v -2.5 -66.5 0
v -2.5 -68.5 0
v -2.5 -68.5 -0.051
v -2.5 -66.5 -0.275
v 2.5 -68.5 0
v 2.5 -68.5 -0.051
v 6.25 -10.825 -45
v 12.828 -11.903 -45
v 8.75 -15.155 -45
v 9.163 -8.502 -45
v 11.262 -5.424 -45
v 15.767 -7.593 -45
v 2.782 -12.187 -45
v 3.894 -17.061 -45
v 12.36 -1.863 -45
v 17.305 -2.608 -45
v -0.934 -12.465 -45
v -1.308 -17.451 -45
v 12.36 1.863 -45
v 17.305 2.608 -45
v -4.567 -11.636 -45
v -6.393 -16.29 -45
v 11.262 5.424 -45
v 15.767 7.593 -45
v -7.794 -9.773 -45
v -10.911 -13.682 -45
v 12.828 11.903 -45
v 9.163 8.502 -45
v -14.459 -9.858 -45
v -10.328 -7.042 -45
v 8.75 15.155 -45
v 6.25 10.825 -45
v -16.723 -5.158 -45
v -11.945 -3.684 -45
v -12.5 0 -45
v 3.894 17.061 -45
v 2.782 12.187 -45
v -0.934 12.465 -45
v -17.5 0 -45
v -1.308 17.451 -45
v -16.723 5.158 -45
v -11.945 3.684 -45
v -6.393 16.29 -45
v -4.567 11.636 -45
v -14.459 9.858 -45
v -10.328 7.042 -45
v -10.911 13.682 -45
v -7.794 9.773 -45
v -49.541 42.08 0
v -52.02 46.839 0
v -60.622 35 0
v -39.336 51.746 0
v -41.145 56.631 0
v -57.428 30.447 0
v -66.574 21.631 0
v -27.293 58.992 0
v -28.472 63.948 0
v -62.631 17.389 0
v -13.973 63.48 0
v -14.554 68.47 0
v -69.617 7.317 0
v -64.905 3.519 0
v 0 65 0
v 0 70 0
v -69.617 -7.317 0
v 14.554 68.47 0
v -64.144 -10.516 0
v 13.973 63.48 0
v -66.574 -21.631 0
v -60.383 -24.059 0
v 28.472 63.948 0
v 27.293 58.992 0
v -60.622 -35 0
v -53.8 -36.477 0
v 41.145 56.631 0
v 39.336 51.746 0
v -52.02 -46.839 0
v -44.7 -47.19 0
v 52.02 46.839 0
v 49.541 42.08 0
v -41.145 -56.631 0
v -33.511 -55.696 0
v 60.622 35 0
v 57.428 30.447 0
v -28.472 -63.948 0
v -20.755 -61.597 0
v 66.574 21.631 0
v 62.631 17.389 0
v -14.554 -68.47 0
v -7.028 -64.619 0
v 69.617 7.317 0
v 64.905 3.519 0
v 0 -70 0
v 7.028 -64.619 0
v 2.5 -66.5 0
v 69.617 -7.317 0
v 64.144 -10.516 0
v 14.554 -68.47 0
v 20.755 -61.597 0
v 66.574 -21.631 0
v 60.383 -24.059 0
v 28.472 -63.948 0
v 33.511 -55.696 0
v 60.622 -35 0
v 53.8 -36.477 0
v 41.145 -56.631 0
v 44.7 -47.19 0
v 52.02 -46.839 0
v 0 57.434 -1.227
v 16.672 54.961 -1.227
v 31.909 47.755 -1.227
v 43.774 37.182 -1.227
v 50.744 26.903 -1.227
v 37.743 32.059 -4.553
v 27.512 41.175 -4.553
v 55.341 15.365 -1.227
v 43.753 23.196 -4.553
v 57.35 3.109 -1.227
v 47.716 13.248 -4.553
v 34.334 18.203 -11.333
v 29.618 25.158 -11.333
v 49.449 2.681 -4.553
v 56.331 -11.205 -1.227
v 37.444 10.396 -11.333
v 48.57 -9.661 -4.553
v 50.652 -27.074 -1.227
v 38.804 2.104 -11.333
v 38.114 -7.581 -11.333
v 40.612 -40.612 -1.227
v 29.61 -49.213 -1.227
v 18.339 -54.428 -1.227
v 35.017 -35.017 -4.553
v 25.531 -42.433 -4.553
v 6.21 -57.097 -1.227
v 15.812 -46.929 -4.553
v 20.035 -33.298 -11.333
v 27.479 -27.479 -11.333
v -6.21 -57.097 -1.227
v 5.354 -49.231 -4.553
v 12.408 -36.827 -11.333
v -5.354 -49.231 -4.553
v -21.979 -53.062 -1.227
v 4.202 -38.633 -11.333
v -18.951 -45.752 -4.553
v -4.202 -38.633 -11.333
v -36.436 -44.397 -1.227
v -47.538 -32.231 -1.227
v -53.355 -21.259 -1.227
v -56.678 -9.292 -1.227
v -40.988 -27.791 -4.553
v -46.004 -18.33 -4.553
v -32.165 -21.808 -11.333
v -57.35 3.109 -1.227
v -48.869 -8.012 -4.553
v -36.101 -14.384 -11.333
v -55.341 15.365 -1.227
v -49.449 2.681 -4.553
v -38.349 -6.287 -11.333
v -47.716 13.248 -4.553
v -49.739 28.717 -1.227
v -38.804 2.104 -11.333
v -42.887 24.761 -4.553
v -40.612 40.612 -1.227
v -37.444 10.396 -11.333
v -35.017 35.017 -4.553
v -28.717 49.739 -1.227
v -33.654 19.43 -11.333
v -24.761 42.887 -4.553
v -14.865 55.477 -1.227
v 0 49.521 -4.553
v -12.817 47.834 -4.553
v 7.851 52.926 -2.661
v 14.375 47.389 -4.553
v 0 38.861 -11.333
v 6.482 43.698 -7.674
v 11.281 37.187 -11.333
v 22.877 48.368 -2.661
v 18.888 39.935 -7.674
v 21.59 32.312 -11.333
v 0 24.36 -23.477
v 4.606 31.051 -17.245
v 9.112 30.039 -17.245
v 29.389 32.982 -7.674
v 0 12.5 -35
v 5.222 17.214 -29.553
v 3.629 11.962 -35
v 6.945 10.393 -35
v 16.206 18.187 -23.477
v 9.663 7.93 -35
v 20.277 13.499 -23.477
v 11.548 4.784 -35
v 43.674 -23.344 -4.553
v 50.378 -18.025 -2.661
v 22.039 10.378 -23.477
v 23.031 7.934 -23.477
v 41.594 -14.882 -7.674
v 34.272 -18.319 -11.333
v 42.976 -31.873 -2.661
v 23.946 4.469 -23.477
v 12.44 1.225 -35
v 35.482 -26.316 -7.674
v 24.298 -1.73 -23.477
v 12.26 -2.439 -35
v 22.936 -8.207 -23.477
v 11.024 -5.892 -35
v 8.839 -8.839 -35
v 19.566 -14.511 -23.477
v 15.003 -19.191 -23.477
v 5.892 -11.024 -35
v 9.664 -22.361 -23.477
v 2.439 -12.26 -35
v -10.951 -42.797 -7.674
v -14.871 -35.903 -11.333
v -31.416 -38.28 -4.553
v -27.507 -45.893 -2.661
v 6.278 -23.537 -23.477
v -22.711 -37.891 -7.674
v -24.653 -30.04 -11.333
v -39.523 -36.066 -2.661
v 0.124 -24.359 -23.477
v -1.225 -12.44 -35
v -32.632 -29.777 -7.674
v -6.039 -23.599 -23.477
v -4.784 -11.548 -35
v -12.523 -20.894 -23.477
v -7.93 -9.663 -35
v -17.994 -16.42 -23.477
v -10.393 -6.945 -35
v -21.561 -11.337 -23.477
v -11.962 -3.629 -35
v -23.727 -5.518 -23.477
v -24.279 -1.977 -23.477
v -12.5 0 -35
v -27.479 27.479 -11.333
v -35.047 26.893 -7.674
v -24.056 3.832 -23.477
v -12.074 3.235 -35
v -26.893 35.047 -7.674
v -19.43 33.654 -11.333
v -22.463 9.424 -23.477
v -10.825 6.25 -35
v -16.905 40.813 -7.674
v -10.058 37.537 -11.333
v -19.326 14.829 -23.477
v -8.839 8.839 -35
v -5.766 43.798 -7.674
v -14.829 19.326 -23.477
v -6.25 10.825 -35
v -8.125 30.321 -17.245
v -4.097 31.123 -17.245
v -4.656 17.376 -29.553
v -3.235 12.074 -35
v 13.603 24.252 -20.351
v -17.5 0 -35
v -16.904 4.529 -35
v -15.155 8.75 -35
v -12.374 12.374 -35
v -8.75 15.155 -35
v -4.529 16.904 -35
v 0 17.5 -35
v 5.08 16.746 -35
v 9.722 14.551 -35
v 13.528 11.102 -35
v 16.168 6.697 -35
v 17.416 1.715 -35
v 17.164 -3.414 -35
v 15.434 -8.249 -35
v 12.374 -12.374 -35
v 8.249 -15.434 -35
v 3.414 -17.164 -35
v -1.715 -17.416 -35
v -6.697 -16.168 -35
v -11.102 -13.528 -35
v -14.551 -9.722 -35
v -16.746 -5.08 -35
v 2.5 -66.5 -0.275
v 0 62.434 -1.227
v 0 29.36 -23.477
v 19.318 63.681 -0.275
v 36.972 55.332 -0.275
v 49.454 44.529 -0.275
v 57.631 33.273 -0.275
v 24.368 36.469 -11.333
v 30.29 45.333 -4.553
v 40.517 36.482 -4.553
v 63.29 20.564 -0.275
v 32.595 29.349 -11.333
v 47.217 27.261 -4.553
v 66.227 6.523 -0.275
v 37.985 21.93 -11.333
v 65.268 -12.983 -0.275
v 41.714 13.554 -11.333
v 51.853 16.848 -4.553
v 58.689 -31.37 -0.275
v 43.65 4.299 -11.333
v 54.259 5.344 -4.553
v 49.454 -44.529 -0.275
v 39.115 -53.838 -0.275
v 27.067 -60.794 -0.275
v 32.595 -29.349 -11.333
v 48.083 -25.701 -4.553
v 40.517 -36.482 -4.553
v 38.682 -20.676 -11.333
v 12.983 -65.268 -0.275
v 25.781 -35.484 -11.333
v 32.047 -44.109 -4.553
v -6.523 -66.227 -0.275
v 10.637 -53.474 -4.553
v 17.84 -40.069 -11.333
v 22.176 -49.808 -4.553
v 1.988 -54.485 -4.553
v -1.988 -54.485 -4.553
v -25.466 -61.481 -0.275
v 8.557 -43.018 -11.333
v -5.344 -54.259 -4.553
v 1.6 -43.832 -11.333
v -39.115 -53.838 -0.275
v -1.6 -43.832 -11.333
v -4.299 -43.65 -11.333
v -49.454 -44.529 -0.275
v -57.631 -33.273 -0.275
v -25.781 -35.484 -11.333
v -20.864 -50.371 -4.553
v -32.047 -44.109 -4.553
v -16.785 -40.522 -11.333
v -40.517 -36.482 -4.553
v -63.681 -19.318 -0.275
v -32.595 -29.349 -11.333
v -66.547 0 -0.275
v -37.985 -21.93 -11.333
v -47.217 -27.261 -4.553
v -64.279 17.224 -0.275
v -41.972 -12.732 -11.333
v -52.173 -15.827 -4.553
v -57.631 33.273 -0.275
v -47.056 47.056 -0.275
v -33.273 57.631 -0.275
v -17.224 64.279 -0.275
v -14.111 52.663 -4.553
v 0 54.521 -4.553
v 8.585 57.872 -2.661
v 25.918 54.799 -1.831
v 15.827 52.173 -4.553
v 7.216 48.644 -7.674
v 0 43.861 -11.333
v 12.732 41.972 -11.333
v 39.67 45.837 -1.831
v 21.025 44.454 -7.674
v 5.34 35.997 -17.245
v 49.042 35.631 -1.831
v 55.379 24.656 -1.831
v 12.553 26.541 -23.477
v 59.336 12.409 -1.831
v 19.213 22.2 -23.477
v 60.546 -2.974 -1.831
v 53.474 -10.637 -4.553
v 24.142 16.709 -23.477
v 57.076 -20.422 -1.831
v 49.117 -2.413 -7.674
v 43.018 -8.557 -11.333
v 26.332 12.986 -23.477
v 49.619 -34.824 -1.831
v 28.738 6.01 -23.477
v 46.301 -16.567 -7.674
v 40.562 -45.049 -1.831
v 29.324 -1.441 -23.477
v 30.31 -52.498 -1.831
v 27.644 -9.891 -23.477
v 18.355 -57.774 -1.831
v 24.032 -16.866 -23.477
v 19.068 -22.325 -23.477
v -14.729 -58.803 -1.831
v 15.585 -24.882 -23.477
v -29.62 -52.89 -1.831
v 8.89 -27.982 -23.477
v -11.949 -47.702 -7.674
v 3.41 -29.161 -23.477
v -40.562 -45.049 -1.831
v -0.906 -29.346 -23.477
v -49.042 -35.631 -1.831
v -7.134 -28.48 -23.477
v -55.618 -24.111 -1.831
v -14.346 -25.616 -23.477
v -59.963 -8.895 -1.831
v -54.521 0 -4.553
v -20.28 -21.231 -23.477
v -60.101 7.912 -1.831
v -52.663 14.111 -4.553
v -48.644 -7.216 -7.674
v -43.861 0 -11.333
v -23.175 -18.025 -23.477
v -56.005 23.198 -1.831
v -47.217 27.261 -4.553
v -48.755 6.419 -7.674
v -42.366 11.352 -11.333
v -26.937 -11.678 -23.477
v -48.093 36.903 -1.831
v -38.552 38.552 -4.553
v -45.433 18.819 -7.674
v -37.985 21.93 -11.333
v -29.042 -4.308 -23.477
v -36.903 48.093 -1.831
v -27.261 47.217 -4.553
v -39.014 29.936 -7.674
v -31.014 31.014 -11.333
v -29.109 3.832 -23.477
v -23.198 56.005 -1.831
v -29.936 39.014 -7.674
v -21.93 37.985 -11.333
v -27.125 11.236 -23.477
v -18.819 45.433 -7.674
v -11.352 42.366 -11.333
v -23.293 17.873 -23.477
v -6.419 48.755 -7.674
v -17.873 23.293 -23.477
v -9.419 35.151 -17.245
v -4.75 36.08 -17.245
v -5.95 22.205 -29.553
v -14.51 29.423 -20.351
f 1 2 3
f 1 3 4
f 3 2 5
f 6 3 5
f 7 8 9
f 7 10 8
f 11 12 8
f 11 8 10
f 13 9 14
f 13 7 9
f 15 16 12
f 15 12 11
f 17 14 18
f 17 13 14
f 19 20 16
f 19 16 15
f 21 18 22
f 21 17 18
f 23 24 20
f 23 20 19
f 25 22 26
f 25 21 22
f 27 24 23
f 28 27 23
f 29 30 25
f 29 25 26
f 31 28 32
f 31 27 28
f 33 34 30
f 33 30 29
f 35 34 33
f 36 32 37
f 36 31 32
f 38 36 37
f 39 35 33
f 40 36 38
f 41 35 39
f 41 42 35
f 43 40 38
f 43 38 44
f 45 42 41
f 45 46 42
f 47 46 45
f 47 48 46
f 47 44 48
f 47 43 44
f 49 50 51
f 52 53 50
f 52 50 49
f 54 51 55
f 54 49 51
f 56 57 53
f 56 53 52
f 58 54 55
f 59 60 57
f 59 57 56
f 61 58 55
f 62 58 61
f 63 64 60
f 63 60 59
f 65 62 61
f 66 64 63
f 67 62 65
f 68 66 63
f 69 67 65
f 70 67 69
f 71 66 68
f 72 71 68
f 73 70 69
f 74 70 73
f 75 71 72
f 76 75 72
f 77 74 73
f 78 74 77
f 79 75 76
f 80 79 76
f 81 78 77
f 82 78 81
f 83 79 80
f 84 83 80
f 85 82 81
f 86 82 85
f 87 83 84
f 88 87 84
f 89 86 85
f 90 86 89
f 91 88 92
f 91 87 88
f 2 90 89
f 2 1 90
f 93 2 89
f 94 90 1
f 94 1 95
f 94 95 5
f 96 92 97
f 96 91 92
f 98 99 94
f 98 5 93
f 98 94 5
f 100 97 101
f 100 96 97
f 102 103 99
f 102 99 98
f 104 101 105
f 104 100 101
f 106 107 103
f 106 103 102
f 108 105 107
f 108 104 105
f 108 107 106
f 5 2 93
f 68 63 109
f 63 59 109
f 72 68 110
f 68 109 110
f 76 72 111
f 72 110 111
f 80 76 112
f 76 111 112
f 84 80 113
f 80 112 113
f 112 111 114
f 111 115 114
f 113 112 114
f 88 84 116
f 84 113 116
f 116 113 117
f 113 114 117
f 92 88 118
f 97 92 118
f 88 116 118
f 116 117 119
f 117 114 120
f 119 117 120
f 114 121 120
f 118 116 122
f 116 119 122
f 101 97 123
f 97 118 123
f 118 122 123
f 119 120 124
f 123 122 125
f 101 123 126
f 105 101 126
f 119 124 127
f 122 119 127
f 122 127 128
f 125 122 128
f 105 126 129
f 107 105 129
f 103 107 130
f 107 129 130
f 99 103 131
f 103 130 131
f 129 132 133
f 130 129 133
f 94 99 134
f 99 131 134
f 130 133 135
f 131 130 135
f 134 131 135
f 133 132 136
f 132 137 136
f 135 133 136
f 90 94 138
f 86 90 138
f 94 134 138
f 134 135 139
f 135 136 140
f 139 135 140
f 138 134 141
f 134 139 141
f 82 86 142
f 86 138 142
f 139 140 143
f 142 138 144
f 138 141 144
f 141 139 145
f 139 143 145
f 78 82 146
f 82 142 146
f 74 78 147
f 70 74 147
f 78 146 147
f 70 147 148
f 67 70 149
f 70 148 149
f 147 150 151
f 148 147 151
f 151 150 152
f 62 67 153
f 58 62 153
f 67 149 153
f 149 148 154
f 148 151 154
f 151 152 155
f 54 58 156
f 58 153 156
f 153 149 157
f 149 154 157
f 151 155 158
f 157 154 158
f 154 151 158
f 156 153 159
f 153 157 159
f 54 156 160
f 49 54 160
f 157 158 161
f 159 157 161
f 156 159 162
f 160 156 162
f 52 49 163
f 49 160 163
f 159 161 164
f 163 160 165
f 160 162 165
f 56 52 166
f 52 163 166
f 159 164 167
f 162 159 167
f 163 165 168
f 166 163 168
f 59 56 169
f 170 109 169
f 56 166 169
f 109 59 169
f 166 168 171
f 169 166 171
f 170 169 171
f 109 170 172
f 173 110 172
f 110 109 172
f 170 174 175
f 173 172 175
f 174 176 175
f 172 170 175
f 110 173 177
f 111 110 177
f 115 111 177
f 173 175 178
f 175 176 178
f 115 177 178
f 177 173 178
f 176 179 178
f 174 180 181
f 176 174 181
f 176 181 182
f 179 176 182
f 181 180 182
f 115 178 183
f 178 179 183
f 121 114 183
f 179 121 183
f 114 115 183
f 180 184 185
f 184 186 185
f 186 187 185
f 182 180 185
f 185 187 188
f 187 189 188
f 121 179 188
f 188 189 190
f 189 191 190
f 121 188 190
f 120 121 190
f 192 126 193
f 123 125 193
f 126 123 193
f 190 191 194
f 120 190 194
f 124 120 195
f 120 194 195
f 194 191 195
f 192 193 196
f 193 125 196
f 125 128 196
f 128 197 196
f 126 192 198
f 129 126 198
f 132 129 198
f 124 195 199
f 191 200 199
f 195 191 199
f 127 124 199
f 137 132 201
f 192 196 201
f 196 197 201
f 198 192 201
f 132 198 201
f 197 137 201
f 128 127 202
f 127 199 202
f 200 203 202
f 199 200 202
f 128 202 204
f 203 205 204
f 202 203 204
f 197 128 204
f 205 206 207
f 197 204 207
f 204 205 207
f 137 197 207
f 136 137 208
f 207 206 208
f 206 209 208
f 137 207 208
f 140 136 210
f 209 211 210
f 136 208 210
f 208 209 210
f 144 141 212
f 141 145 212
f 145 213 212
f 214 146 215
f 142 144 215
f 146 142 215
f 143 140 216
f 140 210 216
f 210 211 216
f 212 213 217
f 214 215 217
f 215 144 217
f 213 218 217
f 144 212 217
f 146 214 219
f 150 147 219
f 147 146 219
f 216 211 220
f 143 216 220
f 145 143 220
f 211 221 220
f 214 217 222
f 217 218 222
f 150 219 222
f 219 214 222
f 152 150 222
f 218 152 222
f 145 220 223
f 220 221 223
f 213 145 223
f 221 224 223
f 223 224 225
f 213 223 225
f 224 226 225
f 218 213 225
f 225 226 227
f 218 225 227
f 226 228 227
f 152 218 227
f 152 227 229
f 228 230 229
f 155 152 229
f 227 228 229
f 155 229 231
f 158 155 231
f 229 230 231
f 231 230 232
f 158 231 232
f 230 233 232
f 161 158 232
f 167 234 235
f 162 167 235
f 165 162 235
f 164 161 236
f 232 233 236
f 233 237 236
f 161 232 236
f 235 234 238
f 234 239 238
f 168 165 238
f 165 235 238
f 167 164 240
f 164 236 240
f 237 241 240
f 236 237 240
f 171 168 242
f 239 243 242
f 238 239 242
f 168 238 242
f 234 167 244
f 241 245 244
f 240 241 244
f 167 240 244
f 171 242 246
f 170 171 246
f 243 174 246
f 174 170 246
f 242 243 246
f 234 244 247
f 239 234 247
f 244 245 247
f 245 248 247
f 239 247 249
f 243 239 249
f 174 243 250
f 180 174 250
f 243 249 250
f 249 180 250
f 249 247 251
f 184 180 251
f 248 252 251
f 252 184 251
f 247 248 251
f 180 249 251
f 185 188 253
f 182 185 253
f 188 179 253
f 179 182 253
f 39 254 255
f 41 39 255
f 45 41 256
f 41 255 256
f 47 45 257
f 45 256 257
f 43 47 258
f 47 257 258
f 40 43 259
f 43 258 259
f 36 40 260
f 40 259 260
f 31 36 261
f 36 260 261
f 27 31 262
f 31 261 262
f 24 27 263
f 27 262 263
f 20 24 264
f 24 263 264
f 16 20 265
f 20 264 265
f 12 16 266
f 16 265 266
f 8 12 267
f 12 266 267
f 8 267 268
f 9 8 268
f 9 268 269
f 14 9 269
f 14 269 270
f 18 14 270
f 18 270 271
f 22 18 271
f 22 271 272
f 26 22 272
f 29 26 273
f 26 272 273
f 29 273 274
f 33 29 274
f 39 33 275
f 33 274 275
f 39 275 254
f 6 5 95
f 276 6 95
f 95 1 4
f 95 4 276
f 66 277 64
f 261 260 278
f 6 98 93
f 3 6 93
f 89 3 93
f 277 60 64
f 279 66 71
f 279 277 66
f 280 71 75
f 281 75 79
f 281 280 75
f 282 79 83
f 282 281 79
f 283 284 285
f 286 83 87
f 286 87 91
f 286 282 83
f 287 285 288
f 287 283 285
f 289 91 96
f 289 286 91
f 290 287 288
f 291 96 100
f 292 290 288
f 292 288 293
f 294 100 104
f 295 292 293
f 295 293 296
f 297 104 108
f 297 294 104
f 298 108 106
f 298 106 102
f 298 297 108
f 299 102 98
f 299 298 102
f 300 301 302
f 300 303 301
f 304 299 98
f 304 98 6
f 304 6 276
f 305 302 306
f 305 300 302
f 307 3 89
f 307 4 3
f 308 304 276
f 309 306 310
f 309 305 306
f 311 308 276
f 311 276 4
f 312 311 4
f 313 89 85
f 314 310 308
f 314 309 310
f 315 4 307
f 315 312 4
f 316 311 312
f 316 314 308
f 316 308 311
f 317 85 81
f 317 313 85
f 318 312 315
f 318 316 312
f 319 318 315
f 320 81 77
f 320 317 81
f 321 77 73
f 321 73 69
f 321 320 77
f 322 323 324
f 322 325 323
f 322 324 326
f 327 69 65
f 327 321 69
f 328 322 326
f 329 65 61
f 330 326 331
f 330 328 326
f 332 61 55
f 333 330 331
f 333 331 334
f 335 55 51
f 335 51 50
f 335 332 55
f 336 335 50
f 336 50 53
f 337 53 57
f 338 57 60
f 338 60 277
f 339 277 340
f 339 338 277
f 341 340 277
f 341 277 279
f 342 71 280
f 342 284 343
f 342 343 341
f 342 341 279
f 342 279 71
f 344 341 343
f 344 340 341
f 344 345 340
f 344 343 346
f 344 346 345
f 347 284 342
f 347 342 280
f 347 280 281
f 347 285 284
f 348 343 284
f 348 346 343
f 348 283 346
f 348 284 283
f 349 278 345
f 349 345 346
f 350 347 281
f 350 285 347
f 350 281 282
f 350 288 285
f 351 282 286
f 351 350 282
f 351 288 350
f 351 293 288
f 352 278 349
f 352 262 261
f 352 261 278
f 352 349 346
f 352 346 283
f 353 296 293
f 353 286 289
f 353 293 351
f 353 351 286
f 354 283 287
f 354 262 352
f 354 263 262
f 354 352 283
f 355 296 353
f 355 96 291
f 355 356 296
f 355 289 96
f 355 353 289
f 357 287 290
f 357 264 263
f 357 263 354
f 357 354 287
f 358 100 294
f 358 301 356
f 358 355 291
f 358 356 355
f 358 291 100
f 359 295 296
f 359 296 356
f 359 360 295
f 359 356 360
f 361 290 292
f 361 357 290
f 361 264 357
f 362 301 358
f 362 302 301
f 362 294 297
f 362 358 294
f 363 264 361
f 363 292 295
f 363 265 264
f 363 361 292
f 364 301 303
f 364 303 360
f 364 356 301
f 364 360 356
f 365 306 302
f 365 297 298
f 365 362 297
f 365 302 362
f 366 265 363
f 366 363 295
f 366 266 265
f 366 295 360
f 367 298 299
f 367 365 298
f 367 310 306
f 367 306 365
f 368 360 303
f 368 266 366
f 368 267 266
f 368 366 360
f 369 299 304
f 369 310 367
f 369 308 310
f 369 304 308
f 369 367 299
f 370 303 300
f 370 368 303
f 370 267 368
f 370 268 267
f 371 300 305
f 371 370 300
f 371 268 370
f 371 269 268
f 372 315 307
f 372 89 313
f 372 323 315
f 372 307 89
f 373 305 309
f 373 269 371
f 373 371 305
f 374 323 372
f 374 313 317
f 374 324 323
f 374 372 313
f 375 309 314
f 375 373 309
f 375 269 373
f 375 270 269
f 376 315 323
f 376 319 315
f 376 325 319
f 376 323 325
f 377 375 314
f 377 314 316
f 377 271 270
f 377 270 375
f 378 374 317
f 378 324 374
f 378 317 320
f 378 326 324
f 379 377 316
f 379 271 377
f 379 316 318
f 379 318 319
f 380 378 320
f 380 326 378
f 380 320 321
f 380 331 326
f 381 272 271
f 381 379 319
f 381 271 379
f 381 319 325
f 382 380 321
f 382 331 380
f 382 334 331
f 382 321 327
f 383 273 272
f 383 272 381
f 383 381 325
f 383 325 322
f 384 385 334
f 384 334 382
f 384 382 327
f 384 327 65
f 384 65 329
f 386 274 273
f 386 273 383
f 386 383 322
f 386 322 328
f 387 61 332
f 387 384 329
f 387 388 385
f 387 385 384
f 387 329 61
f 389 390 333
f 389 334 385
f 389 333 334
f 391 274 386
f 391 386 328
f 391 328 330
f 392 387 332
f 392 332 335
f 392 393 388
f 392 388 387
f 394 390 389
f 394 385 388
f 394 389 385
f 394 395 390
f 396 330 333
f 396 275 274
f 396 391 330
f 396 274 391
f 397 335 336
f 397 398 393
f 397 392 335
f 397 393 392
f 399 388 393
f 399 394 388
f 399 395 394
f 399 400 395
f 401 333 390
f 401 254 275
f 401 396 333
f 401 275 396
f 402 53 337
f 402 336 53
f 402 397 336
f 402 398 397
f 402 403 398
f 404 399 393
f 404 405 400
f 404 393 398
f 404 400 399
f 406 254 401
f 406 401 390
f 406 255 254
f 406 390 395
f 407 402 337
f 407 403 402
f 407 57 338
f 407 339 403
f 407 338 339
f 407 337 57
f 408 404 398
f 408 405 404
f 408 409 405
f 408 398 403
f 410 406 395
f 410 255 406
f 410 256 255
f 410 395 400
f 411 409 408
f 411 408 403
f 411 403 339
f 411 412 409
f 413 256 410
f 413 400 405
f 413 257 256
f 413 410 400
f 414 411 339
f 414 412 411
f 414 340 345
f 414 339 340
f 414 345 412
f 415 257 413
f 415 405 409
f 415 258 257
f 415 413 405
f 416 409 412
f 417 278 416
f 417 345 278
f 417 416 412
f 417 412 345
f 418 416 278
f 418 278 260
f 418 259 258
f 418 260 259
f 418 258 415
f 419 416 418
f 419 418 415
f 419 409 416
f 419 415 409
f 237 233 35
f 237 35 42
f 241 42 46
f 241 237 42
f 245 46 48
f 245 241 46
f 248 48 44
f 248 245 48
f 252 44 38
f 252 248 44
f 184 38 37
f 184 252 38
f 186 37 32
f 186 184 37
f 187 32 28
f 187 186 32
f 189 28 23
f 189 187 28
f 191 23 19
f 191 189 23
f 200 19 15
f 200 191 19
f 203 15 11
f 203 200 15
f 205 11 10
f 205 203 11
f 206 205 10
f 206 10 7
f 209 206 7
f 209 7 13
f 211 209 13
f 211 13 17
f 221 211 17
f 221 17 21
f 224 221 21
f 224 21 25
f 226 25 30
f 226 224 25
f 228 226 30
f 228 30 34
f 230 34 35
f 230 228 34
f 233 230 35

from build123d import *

# Parameters (mm, degrees)
SKETCH2_W           = 5
SKETCH2_H           = 2
CUT_EXTRUDE3_DEPTH  = 10
SKETCH3_R           = 17.5
SKETCH3_R_2         = 12.5
BOSS_EXTRUDE1_DEPTH = 10


with BuildPart() as part:
    # Sketch1 → Revolve1 (revolve)
    with BuildSketch(Plane(origin=(0, 0, 0), x_dir=(0, 0, -1), z_dir=(1, 0, 0))):
        with BuildLine():
            Line((0, 65), (0, 70))
            add(Edge.make_bspline(
                [(0, 70), (0, 52.5), (22.625631329, 29.874368671), (35, 17.5)],
                knots=[0, 0, 0, 0, 1, 1, 1, 1], degree=3))
            Line((35, 17.5), (35, 12.5))
            add(Edge.make_bspline(
                [(0, 65), (0, 47.5), (22.625631329, 24.874368671), (35, 12.5)],
                knots=[0, 0, 0, 0, 1, 1, 1, 1], degree=3))
        make_face()
    revolve(axis=Axis((0, 0, 0), (0, 0, -1)))

    # Sketch2 → Cut-Extrude3 (cut)
    with BuildSketch(Plane.XY):
        with Locations((0, -67.5)):
            Rectangle(SKETCH2_W, SKETCH2_H)
    extrude(amount=-CUT_EXTRUDE3_DEPTH, mode=Mode.SUBTRACT)

    # Sketch3 → Boss-Extrude1 (add)
    with BuildSketch(Plane(origin=(0, 0, -35), x_dir=(-1, 0, 0), z_dir=(0, 0, -1))):
        Circle(SKETCH3_R)
        Circle(SKETCH3_R_2, mode=Mode.SUBTRACT)
    extrude(amount=BOSS_EXTRUDE1_DEPTH)


solid = part.part
